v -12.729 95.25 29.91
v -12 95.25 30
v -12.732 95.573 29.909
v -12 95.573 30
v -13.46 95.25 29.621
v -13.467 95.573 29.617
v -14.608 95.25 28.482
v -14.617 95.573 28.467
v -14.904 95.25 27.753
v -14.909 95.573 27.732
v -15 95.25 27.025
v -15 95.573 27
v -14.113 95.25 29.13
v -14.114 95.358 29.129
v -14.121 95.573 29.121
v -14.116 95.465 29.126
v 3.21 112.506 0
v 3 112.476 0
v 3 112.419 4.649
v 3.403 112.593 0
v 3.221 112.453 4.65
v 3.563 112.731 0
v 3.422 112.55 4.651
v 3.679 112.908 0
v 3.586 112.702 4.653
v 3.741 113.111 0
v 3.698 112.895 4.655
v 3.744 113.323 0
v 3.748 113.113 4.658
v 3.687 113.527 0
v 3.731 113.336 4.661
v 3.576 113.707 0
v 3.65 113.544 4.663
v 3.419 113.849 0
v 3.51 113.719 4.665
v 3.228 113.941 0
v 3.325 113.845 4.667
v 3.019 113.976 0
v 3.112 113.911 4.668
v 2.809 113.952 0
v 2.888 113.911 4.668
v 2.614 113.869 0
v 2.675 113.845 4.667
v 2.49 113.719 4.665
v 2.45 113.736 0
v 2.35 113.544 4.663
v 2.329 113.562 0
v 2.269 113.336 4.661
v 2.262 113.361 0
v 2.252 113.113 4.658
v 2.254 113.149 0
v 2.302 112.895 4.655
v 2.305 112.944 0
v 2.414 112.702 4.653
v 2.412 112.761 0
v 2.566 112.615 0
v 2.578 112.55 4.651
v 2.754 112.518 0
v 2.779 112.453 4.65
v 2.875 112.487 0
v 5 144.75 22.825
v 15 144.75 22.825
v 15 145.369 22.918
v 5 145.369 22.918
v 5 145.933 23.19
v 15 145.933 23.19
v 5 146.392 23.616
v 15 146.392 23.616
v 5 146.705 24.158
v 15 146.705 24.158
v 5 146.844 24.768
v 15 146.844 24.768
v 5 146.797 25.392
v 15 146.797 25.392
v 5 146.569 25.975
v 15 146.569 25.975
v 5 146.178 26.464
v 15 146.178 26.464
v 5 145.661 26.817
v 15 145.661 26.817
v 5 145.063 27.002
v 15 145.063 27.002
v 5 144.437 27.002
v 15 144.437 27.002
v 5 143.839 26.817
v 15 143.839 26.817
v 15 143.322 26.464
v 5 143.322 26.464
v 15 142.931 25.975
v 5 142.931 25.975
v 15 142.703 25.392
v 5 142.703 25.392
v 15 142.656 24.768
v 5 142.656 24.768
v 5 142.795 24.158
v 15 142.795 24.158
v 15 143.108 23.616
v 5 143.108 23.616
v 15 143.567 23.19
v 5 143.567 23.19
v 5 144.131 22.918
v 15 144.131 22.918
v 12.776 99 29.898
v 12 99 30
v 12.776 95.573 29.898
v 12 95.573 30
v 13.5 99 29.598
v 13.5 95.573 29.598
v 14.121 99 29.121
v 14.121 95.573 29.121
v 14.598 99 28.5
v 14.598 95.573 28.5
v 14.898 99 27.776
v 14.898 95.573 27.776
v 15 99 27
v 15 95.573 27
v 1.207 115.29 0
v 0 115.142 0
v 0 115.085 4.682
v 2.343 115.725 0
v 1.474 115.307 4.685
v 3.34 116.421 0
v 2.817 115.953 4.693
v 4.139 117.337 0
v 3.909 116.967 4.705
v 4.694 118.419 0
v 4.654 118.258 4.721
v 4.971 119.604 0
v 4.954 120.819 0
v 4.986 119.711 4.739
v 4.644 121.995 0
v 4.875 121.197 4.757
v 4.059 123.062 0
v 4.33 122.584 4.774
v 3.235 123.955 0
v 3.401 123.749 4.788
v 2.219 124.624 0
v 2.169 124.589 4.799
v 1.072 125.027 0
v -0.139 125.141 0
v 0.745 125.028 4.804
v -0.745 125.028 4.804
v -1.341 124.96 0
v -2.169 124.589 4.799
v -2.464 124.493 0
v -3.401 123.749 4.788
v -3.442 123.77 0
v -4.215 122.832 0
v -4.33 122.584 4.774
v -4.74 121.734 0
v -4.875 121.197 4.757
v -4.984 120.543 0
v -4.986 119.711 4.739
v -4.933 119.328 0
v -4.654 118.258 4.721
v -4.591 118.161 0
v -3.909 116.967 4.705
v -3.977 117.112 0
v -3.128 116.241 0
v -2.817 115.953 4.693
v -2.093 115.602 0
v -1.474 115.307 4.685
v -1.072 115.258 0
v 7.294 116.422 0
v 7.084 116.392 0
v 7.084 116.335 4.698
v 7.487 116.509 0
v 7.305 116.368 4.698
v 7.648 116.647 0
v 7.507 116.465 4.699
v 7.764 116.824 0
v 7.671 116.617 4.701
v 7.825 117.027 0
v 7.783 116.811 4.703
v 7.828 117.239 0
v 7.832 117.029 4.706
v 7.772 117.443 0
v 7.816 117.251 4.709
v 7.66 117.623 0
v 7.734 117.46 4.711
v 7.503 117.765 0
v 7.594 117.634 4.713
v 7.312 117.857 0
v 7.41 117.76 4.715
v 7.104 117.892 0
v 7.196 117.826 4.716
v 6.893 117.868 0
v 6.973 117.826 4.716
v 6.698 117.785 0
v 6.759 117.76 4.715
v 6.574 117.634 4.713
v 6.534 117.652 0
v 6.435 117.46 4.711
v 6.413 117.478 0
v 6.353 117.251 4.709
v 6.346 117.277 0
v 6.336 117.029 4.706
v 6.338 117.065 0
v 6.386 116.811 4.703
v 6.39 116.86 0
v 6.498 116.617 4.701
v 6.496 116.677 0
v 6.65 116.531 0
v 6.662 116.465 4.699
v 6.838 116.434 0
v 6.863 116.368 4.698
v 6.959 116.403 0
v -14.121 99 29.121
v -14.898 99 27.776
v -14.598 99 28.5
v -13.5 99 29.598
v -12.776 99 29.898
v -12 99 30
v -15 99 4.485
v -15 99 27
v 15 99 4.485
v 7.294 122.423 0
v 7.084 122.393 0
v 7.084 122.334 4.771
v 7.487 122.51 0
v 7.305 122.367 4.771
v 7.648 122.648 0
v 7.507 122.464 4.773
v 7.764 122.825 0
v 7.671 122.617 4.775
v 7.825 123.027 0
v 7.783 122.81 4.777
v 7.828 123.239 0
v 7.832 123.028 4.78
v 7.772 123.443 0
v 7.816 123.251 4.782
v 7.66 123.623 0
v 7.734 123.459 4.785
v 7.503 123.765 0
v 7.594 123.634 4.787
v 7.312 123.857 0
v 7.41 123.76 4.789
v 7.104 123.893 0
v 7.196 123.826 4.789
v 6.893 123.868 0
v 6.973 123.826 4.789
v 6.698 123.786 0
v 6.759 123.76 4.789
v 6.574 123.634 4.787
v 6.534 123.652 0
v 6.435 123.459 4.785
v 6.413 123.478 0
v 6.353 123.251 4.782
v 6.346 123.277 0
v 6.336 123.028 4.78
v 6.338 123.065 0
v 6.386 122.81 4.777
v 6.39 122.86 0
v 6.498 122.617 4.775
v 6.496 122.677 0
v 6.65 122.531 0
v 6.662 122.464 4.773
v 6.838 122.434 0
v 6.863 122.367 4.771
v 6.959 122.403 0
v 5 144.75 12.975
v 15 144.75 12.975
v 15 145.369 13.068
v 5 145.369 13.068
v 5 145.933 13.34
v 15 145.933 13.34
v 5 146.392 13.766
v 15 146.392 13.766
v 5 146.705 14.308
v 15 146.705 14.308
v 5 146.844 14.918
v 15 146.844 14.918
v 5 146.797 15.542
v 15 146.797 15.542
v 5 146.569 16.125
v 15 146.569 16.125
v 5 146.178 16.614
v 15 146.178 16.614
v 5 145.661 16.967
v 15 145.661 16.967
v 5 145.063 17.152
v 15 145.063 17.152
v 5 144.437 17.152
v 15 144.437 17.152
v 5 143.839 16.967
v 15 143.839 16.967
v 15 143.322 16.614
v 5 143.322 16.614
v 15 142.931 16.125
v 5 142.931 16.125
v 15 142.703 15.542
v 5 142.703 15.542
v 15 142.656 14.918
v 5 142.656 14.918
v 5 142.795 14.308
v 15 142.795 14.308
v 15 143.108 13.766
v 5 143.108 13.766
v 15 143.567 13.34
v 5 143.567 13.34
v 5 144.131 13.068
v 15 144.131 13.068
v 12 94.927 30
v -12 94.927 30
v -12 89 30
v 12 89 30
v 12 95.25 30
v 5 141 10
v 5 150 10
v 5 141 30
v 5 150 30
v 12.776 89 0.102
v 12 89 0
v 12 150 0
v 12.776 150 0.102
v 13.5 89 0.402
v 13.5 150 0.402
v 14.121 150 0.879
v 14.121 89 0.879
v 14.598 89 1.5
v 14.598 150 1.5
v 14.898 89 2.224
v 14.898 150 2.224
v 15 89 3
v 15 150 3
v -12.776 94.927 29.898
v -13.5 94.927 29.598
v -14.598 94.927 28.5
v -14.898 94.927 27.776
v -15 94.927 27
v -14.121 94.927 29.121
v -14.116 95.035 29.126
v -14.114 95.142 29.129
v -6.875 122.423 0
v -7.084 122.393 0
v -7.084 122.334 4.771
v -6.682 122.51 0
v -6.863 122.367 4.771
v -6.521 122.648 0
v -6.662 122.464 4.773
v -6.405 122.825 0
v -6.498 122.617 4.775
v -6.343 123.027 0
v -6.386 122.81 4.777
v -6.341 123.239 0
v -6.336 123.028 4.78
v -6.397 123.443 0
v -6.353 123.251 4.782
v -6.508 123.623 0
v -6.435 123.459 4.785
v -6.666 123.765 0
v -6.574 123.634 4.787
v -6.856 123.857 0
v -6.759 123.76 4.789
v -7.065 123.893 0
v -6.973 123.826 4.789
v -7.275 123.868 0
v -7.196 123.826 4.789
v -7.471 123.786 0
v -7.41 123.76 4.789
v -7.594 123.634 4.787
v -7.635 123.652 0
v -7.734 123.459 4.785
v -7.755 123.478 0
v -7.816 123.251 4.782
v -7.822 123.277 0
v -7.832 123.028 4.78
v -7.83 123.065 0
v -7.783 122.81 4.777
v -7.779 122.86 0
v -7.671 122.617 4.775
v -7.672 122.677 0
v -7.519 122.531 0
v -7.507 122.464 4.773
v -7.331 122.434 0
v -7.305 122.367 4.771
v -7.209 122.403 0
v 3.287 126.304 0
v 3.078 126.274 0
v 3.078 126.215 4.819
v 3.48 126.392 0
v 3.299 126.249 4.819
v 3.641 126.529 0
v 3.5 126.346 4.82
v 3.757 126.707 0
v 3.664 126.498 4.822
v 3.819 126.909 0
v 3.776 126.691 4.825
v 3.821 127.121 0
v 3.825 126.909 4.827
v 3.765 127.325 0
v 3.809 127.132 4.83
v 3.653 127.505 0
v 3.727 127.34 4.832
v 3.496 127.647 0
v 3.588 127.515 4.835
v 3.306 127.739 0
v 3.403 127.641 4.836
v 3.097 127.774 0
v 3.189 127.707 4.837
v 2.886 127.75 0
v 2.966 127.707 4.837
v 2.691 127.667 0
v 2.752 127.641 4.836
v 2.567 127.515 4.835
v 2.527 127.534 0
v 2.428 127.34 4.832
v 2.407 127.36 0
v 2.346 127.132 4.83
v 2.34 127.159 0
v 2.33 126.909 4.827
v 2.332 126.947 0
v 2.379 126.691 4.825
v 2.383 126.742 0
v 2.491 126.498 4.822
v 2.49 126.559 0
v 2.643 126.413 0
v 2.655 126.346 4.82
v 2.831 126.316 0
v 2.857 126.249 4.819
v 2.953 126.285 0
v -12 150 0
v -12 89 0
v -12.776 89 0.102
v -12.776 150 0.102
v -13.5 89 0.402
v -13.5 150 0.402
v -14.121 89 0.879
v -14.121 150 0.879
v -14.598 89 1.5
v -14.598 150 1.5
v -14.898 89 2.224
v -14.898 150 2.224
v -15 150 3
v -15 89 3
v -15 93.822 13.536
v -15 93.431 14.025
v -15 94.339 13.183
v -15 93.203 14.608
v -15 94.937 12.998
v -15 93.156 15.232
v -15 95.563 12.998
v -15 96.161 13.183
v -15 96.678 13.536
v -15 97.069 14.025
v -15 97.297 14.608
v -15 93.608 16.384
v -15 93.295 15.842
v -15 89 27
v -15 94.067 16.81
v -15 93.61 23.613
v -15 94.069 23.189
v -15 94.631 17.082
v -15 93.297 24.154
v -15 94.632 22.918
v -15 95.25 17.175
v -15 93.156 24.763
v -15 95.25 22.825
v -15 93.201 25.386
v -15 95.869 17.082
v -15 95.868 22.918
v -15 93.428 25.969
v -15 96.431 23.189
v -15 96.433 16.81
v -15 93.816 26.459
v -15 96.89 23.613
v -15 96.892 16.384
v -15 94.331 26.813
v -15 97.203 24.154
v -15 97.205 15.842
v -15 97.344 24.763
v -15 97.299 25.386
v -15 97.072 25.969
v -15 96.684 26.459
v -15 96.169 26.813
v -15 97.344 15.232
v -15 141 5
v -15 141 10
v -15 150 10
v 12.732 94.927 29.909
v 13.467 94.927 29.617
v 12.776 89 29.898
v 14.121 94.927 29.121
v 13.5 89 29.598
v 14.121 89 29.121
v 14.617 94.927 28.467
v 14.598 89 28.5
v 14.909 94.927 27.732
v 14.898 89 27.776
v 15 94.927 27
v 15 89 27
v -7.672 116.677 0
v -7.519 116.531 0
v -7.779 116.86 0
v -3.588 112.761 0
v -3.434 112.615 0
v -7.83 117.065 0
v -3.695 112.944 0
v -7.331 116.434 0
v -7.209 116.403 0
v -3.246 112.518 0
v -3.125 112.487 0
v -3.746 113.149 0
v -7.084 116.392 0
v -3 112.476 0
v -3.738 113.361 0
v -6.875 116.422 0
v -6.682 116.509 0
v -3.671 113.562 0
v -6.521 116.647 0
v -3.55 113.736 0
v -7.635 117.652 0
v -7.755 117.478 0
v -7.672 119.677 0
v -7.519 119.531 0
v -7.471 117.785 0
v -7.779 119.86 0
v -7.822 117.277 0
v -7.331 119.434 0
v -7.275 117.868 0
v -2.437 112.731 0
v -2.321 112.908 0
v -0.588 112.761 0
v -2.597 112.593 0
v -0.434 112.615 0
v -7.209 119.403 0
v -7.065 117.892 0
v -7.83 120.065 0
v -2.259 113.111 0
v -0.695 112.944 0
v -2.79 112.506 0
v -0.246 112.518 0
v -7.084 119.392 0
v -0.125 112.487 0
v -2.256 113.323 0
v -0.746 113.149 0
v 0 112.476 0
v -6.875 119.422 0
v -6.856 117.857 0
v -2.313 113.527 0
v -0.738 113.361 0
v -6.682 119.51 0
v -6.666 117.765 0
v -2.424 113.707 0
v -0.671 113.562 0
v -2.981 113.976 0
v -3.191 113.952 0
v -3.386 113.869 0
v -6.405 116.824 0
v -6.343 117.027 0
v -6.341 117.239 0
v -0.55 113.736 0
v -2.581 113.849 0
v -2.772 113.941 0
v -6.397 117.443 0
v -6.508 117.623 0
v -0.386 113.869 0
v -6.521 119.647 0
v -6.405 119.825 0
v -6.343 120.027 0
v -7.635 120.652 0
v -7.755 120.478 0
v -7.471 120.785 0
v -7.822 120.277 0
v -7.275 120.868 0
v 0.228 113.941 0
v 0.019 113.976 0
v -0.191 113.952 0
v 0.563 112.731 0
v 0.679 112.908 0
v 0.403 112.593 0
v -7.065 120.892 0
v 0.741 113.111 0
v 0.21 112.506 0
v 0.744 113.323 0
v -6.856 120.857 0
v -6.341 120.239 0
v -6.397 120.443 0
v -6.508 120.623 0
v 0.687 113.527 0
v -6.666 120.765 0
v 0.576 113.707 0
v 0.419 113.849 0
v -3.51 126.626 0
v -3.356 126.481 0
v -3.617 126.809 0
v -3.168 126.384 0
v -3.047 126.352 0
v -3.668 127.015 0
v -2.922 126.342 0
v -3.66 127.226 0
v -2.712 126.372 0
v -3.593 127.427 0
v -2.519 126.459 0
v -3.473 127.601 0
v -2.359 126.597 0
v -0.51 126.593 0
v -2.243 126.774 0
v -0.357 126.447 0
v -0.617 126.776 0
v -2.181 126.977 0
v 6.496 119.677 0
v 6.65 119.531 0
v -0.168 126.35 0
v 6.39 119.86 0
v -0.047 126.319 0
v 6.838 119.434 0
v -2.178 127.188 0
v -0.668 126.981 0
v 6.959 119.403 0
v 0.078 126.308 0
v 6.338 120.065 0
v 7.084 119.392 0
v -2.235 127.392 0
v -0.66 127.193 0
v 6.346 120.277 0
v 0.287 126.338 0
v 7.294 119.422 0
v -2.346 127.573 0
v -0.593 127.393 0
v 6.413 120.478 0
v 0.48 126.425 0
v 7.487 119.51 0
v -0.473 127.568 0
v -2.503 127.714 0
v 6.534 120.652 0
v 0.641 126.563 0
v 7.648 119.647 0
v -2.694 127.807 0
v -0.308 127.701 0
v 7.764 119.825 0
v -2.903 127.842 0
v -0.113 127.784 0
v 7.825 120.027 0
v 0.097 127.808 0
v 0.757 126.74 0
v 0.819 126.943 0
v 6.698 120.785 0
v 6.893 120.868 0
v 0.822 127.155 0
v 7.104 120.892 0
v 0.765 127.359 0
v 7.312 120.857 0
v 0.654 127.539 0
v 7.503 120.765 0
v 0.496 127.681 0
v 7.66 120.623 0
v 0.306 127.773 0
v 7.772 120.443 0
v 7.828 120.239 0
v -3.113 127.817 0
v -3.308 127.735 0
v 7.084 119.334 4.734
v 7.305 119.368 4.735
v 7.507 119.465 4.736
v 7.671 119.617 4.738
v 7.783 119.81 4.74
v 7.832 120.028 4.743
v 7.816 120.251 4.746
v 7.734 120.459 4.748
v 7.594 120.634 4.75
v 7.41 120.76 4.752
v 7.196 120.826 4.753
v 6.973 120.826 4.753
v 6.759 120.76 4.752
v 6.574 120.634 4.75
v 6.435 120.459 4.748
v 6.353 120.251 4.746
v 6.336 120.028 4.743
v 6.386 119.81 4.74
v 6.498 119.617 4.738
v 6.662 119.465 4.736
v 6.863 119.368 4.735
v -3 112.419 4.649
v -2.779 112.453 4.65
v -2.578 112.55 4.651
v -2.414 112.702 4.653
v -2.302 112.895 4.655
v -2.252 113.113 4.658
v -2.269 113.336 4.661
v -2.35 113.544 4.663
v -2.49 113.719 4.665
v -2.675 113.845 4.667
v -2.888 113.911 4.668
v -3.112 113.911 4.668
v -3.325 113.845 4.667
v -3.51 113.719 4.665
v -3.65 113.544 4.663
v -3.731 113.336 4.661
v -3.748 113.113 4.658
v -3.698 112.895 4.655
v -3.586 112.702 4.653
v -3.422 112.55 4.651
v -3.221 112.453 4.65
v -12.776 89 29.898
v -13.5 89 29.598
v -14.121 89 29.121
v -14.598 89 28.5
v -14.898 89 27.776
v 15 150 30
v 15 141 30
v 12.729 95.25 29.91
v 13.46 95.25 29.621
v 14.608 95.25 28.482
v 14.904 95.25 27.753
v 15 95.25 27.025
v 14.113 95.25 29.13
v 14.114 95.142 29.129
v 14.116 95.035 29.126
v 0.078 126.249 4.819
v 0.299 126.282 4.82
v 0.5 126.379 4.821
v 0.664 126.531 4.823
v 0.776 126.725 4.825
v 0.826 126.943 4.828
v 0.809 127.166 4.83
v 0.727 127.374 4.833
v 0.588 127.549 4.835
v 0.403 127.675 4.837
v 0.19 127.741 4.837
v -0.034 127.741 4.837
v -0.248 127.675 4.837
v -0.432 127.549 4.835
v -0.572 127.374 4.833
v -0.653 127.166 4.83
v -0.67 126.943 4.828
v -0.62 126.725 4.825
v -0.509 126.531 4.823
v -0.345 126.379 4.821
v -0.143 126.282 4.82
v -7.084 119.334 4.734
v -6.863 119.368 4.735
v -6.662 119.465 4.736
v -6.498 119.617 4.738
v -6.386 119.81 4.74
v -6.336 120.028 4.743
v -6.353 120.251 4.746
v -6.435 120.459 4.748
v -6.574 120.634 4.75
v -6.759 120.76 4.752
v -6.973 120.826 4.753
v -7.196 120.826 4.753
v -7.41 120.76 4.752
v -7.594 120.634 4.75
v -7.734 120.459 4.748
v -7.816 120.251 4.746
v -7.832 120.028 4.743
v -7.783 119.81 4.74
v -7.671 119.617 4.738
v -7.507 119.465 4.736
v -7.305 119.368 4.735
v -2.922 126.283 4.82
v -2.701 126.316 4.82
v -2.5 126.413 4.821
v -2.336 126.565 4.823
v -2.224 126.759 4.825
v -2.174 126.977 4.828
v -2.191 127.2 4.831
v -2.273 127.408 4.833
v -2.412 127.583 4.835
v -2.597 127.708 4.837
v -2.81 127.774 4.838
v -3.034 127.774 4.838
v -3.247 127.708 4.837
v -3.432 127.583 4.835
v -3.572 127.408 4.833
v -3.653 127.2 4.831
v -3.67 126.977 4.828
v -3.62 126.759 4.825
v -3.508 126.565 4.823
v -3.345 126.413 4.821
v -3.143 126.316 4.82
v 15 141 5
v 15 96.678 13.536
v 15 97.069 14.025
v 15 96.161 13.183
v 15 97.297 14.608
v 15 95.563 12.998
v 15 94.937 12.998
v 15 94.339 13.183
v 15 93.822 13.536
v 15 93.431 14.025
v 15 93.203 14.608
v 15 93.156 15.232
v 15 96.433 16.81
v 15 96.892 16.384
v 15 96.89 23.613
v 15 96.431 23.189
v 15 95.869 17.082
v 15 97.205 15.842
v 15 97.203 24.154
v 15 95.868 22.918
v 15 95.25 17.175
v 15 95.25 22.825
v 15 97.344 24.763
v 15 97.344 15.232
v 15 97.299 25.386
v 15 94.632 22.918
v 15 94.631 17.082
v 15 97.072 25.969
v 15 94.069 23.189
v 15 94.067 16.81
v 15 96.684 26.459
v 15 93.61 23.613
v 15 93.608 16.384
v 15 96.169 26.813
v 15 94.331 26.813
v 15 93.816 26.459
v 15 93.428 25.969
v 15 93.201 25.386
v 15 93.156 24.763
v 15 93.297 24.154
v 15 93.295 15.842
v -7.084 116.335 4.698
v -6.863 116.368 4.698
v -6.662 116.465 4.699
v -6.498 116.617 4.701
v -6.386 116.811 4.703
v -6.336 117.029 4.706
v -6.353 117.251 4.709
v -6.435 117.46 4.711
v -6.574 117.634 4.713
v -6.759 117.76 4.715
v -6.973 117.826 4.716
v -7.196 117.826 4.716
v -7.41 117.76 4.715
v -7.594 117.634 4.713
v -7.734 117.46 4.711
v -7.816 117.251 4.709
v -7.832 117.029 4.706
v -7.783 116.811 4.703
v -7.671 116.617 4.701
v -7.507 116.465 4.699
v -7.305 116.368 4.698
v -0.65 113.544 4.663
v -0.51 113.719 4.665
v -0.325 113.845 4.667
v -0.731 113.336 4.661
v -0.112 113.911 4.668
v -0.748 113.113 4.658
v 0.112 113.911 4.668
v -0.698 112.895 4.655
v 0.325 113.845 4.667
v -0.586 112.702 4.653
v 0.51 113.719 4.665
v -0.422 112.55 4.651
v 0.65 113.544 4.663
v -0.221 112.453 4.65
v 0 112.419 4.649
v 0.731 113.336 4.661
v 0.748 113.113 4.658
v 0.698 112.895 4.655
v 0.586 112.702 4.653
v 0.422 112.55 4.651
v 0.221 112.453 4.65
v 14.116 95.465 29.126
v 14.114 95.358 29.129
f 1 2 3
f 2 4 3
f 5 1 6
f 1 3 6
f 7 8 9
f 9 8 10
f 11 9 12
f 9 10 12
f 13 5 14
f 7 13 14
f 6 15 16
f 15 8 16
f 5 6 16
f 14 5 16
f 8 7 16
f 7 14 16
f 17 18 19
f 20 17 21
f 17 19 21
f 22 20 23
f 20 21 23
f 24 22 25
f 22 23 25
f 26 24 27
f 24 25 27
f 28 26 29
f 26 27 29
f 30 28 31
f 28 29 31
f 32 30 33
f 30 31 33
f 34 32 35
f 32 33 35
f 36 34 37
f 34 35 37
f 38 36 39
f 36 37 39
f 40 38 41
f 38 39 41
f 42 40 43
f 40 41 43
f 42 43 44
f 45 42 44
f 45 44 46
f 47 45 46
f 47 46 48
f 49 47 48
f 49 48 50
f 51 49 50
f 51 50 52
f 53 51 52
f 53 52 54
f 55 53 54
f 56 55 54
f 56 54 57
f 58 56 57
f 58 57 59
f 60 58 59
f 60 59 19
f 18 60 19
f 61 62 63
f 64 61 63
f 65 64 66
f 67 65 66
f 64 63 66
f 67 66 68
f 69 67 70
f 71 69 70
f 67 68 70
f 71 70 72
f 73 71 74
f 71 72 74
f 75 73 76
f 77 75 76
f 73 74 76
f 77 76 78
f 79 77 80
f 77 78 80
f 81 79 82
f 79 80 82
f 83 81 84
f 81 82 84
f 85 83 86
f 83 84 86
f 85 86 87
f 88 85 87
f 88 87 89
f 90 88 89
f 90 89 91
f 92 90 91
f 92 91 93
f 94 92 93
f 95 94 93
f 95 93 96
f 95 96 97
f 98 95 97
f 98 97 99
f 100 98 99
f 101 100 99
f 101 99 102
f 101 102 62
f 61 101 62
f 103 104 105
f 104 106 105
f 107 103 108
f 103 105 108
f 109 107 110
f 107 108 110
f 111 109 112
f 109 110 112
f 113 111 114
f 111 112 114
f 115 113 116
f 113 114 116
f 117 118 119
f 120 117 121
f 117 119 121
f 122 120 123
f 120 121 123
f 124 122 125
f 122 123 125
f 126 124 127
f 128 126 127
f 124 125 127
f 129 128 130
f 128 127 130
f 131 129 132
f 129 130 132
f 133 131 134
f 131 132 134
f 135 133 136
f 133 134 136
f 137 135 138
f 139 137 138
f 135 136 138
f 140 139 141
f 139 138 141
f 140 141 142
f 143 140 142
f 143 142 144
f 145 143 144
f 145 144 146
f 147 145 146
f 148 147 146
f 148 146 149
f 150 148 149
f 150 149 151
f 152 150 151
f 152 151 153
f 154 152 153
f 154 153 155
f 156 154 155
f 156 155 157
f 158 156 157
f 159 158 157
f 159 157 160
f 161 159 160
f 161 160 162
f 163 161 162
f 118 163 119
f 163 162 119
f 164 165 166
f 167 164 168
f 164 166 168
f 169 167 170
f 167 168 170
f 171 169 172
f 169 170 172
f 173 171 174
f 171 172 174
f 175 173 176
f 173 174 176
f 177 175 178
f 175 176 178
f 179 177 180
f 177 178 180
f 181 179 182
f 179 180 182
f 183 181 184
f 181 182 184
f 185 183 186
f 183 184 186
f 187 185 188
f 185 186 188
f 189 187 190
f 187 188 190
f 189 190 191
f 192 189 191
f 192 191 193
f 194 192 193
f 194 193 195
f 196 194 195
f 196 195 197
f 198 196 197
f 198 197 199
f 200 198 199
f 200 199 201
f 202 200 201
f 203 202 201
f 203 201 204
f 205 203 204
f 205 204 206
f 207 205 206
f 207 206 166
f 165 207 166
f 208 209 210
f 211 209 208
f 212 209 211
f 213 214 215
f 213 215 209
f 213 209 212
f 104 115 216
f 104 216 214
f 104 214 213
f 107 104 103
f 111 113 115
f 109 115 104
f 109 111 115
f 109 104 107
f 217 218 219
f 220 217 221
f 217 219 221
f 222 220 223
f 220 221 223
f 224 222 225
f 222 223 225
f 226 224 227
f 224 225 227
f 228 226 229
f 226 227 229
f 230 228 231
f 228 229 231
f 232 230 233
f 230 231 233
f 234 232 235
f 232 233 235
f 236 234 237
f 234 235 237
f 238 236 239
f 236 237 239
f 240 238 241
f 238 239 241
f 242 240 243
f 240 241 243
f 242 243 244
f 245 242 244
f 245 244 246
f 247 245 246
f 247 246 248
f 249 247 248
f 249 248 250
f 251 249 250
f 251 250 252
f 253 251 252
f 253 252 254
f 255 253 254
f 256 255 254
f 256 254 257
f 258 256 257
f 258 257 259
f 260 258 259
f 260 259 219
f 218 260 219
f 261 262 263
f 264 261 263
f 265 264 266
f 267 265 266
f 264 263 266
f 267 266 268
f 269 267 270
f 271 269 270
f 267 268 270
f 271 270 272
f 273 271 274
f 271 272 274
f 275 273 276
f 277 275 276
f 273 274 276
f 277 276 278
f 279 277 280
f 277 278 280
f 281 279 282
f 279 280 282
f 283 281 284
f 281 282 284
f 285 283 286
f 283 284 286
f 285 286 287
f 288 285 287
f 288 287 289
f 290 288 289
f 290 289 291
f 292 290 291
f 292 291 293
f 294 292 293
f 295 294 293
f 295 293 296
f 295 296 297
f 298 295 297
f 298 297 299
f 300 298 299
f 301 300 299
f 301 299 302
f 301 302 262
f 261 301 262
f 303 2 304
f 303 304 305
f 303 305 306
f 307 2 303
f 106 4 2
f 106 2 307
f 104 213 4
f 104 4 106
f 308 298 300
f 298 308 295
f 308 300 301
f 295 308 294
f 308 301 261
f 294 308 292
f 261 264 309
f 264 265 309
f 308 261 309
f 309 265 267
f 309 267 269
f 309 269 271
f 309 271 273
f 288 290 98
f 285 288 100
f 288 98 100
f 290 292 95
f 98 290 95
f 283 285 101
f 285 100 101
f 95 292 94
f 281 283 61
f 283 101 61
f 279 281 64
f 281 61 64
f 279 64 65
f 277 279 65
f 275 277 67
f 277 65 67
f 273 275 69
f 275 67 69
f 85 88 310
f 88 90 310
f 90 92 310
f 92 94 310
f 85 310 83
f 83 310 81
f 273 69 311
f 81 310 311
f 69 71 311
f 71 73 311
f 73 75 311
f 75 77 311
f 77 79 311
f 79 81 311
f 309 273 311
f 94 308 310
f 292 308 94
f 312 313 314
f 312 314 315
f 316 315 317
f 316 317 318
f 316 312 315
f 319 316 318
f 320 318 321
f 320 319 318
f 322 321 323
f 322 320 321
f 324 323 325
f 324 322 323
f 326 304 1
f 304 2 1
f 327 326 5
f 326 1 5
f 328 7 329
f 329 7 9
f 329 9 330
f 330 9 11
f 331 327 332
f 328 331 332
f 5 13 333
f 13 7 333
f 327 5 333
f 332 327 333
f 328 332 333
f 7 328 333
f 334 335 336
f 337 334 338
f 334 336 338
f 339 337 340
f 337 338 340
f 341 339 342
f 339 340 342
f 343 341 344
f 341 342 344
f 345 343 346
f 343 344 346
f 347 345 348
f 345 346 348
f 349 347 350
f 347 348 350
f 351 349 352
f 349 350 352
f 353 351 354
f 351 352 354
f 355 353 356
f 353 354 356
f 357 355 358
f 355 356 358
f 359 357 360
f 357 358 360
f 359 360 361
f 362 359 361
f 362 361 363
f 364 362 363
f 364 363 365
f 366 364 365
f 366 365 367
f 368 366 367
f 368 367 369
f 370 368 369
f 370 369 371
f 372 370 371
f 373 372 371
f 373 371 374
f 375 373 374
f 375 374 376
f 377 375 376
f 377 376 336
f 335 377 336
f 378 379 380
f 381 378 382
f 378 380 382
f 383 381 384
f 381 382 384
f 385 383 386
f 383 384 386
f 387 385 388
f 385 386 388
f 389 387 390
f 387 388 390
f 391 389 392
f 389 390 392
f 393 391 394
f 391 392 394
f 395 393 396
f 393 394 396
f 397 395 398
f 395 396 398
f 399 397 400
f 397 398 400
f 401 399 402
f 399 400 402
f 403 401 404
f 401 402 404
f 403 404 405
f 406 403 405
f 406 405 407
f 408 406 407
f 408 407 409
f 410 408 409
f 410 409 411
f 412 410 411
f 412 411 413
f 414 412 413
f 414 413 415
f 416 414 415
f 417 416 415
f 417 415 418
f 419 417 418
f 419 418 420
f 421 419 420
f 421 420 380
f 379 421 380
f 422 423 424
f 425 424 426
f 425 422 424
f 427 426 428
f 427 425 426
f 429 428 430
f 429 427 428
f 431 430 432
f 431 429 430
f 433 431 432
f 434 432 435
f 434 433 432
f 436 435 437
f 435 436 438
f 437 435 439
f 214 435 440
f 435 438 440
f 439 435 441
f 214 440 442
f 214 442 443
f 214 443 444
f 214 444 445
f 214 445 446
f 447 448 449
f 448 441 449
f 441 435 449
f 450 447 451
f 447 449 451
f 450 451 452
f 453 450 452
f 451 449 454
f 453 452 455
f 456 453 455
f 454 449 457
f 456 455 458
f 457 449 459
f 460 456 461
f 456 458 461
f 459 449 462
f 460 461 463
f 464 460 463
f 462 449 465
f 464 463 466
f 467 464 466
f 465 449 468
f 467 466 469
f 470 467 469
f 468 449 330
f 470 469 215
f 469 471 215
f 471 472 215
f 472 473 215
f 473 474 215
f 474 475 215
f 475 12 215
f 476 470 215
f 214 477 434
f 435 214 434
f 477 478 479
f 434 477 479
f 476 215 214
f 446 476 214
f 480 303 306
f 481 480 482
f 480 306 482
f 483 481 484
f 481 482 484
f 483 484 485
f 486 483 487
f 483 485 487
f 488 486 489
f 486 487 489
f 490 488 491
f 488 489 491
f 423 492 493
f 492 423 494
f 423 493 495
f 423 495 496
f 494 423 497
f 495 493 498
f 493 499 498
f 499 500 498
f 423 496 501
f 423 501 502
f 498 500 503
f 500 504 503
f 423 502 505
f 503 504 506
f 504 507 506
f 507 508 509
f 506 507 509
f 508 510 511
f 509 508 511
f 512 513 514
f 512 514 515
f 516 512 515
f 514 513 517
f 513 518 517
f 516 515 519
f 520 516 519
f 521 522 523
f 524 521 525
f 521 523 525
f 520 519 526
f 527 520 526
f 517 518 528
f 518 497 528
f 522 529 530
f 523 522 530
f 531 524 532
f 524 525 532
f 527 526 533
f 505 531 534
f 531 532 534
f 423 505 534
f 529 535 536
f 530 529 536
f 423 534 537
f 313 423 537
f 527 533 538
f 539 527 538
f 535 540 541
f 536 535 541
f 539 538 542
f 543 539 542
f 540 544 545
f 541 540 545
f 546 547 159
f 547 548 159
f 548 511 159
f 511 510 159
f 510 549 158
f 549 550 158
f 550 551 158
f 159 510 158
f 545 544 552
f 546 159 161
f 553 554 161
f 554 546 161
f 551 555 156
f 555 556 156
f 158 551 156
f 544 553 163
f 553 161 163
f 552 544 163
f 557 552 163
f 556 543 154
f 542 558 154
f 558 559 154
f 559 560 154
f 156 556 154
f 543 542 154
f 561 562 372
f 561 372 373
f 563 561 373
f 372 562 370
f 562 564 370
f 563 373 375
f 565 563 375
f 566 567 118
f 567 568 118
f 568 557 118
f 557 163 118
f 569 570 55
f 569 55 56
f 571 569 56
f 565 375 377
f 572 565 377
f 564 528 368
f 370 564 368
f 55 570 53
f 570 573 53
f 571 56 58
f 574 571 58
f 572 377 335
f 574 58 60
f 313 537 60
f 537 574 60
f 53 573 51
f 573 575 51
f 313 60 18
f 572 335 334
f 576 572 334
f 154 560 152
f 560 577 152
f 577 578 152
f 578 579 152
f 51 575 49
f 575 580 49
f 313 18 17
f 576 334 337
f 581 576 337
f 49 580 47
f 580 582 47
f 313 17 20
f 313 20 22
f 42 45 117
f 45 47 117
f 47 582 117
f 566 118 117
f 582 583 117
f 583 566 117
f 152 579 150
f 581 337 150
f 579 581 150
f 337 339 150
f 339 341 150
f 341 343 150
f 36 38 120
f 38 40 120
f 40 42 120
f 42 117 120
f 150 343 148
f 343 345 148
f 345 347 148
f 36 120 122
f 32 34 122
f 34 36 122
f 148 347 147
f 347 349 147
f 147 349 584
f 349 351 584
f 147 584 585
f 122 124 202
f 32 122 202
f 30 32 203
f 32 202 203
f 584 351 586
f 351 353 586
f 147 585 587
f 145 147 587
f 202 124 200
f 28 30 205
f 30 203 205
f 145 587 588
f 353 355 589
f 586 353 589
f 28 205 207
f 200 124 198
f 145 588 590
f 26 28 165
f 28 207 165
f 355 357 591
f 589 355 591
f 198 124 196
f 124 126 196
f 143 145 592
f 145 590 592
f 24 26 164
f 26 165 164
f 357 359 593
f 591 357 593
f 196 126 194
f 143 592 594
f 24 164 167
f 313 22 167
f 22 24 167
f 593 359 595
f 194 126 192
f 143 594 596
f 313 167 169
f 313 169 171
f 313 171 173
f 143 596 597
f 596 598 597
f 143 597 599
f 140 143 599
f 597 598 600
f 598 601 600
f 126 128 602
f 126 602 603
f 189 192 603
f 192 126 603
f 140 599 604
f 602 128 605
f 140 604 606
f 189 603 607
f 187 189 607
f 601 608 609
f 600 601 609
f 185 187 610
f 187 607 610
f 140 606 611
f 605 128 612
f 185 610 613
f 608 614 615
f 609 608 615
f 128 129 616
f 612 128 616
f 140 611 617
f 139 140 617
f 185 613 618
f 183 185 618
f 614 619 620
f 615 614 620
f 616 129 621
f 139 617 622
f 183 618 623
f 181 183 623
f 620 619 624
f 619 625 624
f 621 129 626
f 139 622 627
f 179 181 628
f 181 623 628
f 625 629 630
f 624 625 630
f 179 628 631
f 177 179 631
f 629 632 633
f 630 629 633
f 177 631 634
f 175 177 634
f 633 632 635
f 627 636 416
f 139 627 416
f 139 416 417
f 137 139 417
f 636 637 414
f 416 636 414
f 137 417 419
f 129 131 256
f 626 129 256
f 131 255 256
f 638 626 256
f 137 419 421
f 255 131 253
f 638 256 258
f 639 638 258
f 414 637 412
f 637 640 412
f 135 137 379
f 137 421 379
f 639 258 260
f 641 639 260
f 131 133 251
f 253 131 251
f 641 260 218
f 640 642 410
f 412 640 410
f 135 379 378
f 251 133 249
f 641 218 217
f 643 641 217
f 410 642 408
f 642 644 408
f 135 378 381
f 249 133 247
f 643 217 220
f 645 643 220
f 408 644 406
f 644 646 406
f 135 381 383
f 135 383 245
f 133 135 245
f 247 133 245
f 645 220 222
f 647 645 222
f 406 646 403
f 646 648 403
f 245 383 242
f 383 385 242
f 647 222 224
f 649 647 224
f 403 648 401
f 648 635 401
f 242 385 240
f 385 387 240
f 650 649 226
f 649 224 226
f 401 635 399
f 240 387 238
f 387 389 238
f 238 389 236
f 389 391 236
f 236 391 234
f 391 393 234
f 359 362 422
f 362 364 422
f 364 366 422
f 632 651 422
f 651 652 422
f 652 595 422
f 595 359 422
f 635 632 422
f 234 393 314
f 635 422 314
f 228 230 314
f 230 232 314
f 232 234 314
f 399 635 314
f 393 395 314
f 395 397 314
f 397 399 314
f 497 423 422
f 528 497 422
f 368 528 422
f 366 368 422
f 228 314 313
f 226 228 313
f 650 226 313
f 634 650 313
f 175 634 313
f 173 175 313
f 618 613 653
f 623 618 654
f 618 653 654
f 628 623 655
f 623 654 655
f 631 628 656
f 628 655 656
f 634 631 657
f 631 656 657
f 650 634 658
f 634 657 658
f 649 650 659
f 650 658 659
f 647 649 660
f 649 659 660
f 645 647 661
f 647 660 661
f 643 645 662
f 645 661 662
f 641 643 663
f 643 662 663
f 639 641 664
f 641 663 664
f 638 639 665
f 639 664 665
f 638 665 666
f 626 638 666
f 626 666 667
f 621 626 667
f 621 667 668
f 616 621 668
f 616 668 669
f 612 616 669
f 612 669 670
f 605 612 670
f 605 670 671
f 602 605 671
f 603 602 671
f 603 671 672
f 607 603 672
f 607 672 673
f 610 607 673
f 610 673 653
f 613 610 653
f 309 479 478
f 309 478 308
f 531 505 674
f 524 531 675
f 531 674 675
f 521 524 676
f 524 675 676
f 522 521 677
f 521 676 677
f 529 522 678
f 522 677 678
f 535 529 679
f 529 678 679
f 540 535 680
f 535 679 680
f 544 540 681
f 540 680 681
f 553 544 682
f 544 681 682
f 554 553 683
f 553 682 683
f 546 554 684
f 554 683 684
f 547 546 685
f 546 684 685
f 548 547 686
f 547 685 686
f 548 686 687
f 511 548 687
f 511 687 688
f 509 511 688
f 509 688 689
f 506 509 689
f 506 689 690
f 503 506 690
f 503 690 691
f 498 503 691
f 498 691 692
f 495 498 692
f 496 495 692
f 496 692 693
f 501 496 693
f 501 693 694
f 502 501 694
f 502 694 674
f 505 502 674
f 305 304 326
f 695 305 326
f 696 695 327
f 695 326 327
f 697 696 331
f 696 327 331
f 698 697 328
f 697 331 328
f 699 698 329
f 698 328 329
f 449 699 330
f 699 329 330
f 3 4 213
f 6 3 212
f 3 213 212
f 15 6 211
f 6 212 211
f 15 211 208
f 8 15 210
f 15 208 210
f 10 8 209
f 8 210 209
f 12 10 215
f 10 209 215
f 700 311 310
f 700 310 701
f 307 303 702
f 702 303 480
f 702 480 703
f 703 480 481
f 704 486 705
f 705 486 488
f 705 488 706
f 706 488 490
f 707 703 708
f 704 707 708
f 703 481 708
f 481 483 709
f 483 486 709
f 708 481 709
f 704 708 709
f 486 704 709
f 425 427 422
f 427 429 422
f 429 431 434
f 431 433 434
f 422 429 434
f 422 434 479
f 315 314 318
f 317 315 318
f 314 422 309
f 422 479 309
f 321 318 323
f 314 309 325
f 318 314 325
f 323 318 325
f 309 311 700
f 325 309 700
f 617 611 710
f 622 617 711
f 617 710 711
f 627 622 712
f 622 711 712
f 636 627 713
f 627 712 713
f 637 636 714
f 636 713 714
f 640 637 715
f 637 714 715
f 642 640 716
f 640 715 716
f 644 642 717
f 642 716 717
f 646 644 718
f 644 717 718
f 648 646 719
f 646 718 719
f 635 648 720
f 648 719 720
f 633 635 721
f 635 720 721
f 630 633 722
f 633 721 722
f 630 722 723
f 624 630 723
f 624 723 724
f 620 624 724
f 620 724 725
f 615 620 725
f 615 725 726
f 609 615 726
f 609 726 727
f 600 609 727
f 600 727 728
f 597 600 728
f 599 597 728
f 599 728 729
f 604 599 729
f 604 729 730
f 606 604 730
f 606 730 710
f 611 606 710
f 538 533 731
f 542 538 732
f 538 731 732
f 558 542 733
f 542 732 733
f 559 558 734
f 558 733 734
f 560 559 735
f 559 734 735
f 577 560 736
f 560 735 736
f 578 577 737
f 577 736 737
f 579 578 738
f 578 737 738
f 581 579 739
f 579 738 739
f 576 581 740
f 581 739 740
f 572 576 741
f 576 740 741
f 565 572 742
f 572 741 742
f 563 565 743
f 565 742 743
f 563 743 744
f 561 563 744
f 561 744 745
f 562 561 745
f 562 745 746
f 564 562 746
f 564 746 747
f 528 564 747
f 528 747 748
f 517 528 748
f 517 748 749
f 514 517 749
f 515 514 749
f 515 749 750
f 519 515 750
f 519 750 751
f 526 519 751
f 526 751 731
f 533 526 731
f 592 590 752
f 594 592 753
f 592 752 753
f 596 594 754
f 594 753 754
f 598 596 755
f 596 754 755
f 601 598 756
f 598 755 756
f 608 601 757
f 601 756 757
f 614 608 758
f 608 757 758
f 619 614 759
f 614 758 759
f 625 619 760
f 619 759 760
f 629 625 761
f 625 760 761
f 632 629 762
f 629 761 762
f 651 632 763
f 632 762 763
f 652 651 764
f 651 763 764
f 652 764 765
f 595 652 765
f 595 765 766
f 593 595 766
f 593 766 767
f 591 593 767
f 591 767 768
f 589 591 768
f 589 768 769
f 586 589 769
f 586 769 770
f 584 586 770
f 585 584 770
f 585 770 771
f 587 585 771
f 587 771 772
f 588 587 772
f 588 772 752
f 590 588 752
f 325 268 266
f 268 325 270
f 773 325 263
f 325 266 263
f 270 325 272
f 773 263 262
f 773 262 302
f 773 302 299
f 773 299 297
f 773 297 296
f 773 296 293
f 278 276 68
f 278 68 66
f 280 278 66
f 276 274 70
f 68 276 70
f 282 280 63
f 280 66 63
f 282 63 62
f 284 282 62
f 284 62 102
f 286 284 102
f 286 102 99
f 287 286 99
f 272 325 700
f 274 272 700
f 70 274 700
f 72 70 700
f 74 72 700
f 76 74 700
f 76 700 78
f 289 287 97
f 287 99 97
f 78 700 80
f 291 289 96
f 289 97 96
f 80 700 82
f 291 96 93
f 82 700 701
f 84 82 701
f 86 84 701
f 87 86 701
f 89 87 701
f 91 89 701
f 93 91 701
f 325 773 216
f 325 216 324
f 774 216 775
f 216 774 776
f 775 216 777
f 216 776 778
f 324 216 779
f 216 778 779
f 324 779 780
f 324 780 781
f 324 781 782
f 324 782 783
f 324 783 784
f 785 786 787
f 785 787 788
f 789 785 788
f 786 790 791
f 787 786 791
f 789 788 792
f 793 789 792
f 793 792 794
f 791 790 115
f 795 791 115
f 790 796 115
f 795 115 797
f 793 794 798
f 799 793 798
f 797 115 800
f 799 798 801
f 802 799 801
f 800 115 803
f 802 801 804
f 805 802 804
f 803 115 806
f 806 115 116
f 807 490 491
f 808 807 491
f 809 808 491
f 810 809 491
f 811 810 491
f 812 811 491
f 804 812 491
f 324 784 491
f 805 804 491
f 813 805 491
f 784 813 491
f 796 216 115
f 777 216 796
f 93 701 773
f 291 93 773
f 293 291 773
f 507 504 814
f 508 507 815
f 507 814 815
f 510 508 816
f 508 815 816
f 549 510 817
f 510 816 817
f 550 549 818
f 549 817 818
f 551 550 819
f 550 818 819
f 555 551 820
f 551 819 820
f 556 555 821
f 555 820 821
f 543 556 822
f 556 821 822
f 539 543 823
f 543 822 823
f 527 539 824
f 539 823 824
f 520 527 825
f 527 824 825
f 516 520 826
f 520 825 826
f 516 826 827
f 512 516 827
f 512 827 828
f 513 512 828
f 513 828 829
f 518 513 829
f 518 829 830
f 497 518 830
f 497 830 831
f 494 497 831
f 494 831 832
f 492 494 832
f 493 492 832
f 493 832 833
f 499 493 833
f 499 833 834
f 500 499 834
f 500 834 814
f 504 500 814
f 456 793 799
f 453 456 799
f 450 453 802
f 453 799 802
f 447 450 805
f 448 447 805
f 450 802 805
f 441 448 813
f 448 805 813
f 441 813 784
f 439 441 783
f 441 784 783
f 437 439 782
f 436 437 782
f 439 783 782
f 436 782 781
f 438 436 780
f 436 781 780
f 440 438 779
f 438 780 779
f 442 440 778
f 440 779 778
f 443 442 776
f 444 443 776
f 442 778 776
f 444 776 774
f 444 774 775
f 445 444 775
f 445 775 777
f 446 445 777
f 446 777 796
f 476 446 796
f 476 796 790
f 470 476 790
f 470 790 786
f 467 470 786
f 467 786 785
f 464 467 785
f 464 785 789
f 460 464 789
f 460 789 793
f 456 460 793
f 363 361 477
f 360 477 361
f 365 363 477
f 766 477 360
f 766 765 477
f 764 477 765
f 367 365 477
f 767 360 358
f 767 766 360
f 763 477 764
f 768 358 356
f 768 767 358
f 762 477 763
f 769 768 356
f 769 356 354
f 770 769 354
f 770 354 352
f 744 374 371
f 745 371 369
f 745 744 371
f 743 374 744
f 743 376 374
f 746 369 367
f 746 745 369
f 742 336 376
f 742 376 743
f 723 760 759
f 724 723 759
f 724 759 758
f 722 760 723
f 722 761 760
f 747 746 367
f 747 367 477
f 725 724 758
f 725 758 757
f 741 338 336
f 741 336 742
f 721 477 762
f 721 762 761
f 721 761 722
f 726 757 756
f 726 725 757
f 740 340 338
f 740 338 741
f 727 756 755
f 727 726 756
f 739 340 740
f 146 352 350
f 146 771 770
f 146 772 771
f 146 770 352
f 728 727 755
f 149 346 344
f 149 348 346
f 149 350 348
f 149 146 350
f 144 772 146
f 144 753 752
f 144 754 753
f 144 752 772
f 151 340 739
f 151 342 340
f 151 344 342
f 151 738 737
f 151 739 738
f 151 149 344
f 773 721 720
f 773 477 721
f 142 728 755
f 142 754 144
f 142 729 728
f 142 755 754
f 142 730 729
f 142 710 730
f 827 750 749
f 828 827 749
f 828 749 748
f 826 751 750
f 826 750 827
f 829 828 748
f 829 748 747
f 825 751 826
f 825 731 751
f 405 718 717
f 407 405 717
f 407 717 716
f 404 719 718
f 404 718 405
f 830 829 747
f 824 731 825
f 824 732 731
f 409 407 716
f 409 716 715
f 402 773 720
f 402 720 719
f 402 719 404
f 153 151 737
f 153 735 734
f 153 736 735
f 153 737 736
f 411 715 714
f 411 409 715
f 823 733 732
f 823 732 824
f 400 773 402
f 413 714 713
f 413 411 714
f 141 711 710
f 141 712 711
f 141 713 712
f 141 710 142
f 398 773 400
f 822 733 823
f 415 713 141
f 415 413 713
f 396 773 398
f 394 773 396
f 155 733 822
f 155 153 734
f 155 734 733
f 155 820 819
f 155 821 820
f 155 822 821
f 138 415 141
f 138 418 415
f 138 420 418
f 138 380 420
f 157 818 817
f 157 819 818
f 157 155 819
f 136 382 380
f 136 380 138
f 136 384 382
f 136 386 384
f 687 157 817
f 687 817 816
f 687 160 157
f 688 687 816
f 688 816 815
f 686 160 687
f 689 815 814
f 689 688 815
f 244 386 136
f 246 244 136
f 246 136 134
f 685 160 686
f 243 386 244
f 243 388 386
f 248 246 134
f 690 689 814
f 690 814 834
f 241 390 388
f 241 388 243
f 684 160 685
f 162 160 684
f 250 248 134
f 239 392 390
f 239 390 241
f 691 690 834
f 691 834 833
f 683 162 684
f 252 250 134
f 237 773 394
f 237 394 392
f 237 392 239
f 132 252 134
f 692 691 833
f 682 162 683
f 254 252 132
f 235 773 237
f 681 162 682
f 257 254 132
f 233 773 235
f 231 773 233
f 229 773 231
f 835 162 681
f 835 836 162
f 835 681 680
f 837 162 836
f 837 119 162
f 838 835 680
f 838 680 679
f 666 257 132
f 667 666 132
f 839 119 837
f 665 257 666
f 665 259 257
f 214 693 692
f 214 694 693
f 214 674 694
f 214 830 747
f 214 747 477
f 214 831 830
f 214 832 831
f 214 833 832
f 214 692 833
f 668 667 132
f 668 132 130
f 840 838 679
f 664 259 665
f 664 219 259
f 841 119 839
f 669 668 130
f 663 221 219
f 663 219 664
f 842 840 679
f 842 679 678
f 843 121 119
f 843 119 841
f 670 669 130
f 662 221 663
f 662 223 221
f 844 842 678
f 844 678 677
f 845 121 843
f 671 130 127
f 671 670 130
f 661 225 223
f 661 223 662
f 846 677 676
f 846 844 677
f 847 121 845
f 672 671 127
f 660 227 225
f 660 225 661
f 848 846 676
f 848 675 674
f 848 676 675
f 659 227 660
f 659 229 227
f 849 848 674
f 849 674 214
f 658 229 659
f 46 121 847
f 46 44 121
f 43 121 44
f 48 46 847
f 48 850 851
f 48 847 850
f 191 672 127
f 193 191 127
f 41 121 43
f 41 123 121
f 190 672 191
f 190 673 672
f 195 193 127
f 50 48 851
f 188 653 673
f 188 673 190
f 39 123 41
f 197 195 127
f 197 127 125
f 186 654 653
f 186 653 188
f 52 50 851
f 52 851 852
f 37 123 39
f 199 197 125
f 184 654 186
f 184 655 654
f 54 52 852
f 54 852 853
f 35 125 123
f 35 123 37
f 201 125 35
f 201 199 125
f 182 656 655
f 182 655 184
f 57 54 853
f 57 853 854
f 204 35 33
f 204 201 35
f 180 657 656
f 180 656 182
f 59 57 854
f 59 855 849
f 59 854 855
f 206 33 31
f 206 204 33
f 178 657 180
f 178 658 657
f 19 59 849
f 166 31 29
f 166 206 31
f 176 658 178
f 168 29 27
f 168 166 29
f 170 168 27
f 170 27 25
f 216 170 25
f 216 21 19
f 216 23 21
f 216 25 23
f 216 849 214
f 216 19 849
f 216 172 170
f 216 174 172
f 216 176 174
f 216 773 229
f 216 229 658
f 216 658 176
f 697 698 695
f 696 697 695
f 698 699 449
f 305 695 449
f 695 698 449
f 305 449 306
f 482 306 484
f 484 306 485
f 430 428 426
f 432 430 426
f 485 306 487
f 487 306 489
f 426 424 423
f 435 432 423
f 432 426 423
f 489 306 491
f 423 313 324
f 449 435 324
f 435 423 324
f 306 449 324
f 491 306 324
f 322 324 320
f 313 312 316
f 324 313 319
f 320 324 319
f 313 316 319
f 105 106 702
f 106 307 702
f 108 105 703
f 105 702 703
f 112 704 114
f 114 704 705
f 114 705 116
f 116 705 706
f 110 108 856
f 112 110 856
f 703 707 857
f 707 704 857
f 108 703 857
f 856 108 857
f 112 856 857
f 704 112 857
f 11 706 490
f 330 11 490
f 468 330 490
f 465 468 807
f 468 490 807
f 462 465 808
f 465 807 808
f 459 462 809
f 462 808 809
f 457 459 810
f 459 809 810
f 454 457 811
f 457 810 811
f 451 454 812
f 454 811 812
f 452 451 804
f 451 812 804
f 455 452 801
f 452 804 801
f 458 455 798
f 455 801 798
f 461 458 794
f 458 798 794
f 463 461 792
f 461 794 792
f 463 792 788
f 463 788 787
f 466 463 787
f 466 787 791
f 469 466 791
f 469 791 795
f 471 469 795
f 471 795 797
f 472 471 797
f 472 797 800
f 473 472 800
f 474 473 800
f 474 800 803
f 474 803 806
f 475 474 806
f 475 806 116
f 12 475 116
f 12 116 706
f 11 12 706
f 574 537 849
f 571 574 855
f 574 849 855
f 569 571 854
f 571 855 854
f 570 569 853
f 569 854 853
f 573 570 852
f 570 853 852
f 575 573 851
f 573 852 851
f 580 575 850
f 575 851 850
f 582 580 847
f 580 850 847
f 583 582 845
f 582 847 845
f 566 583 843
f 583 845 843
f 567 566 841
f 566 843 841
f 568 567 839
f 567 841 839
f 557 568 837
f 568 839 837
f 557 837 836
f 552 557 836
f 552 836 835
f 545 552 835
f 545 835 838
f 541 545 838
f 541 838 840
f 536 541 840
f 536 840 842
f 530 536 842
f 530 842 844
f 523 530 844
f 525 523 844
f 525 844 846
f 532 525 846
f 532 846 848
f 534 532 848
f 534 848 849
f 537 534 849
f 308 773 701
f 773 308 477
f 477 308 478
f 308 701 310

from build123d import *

# Parameters (mm, degrees)
SKETCH_1_W          = 44.75
SKETCH_1_H          = 50
EXTRUDE_1_DEPTH     = 30
SHELL_1_T           = 5
FILLET_1_R          = 5
SKETCH_2_R          = 0.75
CUT_EXTRUDE_1_DEPTH = 70.264438928
SKETCH_3_R          = 5
CUT_EXTRUDE_2_DEPTH = 70.264438928
EXTRUDE_2_DEPTH     = 30
CUT_EXTRUDE_3_DEPTH = 20
SKETCH_7_R          = 2.1
CUT_EXTRUDE_4_DEPTH = 159.731347329
SKETCH_8_W          = 18
SKETCH_8_H          = 45
CUT_EXTRUDE_5_DEPTH = 10
SKETCH_9_W          = 18
SKETCH_9_H          = 45
CUT_EXTRUDE_6_DEPTH = 10
FILLET_2_R          = 3
SKETCH_10_W         = 85.567589514
SKETCH_10_H         = 51.13951385
CUT_EXTRUDE_7_DEPTH = 122.018141743
CUT_EXTRUDE_8_DEPTH = 156.88457272
SKETCH_12_R         = 5
SKETCH_12_R_2       = 0.75
CUT_EXTRUDE_9_DEPTH = 154.138857117


with BuildPart() as part:
    # 草图1 → 凸台-拉伸1 (new body)
    with BuildSketch(Plane.XY):
        Rectangle(SKETCH_1_W, SKETCH_1_H)
    extrude(amount=EXTRUDE_1_DEPTH)

    # 抽壳1
    shell_1_openings = [part.faces().sort_by_distance(p)[0] for p in [
        (0, -25, 15),
        (0, 0, 0),
        (0, 0, 30),
    ]]
    offset(amount=SHELL_1_T, openings=shell_1_openings, kind=Kind.INTERSECTION)

    # 圆角1
    # the kernel refuses this fillet: 5 mm, written as the material it takes off along each edge
    with BuildSketch(Plane(origin=(-27.375, 30, -12.5), x_dir=(1, 0, 0), z_dir=(0, 0, 1)), Plane(origin=(-27.375, -25, 42.5), x_dir=(1, 0, 0), z_dir=(0, 0, -1)), Plane(origin=(27.375, -25, -12.5), x_dir=(-1, 0, 0), z_dir=(0, 0, 1)), Plane(origin=(27.375, 30, 42.5), x_dir=(-1, 0, 0), z_dir=(0, 0, -1))) as fillet_1_piece_1:
        with BuildLine():
            CenterArc((FILLET_1_R, -FILLET_1_R), FILLET_1_R, 90, 90)
            Line((0, -FILLET_1_R), (0, 0))
            Line((0, 0), (FILLET_1_R, 0))
        make_face()
    extrude(amount=55, mode=Mode.SUBTRACT)
    with BuildSketch(Plane(origin=(-27.375, -37.5, 30), x_dir=(1, 0, 0), z_dir=(0, 1, 0)), Plane(origin=(27.375, 42.5, 30), x_dir=(-1, 0, 0), z_dir=(0, -1, 0))) as fillet_1_piece_2:
        with BuildLine():
            CenterArc((FILLET_1_R, FILLET_1_R), FILLET_1_R, 180, 90)
            Line((0, FILLET_1_R), (0, 0))
            Line((0, 0), (FILLET_1_R, 0))
        make_face()
    extrude(amount=80, mode=Mode.SUBTRACT)
    with BuildSketch(Plane(origin=(-27.375, -37.5, 0), x_dir=(1, 0, 0), z_dir=(0, 1, 0)), Plane(origin=(27.375, 42.5, 0), x_dir=(-1, 0, 0), z_dir=(0, -1, 0))) as fillet_1_piece_3:
        with BuildLine():
            CenterArc((FILLET_1_R, -FILLET_1_R), FILLET_1_R, 90, 90)
            Line((0, -FILLET_1_R), (0, 0))
            Line((0, 0), (FILLET_1_R, 0))
        make_face()
    extrude(amount=80, mode=Mode.SUBTRACT)

    # 草图2 → 切除-拉伸1 (cut, through all)
    with BuildSketch(Plane.ZY.offset(27.375)):
        with Locations(Location((15, 7, 0), (0, 0, 270))):
            Circle(SKETCH_2_R)
        with Locations(Location((12, 7, 0), (0, 0, 270))):
            Circle(SKETCH_2_R)
        with Locations(Location((18, 7, 0), (0, 0, 270))):
            Circle(SKETCH_2_R)
        with Locations(Location((8, -3, 0), (0, 0, 90))):
            Circle(SKETCH_2_R)
        with Locations(Location((8, 0, 0), (0, 0, 90))):
            Circle(SKETCH_2_R)
        with Locations(Location((8, 3, 0), (0, 0, 90))):
            Circle(SKETCH_2_R)
        with Locations(Location((12, -7, 0), (0, 0, 90))):
            Circle(SKETCH_2_R)
        with Locations(Location((15, -7, 0), (0, 0, 90))):
            Circle(SKETCH_2_R)
        with Locations(Location((18, -7, 0), (0, 0, 90))):
            Circle(SKETCH_2_R)
        with Locations(Location((22, -3, 0), (0, 0, 270))):
            Circle(SKETCH_2_R)
        with Locations(Location((22, 0, 0), (0, 0, 270))):
            Circle(SKETCH_2_R)
        with Locations(Location((22, 3, 0), (0, 0, 270))):
            Circle(SKETCH_2_R)
    extrude(amount=-CUT_EXTRUDE_1_DEPTH, mode=Mode.SUBTRACT)

    # 草图3 → 切除-拉伸2 (cut, through all)
    with BuildSketch(Plane(origin=(27.375, 0, 0), x_dir=(0, 0, -1), z_dir=(1, 0, 0))):
        with Locations(Location((-15, 0, 0), (0, 0, 90))):
            Circle(SKETCH_3_R)
    extrude(amount=-CUT_EXTRUDE_2_DEPTH, mode=Mode.SUBTRACT)

    # 草图4 → 凸台-拉伸2 (add)
    with BuildSketch(Plane.XY.offset(30)):
        Polygon((0, 30), (-15, 30), (-15, 150), (15, 150), (15, 30), align=None)
    extrude(amount=-EXTRUDE_2_DEPTH)

    # 草图6 → 切除-拉伸3 (cut)
    with BuildSketch(Plane.XY.offset(30)):
        Polygon((-15, 99), (15, 99), (15, 141), (5, 141), (5, 150), (-15, 150), (-15, 141), align=None)
    extrude(amount=-CUT_EXTRUDE_3_DEPTH, mode=Mode.SUBTRACT)

    # 草图7 → 切除-拉伸4 (cut, through all)
    with BuildSketch(Plane(origin=(15, 0, 0), x_dir=(0, 0, -1), z_dir=(1, 0, 0))):
        with Locations((-24.925, 144.75)):
            Circle(SKETCH_7_R)
        with Locations((-15.075, 144.75)):
            Circle(SKETCH_7_R)
        with Locations(Location((-15.075, 95.25, 0), (0, 0, 180))):
            Circle(SKETCH_7_R)
        with Locations(Location((-24.925, 95.25, 0), (0, 0, 180))):
            Circle(SKETCH_7_R)
    extrude(amount=-CUT_EXTRUDE_4_DEPTH, mode=Mode.SUBTRACT)

    # 草图8 → 切除-拉伸5 (cut)
    with BuildSketch(Plane.XY.offset(30)):
        with Locations((0, 64.5)):
            Rectangle(SKETCH_8_W, SKETCH_8_H)
    extrude(amount=-CUT_EXTRUDE_5_DEPTH, mode=Mode.SUBTRACT)

    # 草图9 → 切除-拉伸6 (cut)
    with BuildSketch(Plane(origin=(0, 0, 0), x_dir=(-1, 0, 0), z_dir=(0, 0, -1))):
        with Locations((0, 65)):
            Rectangle(SKETCH_9_W, SKETCH_9_H)
    extrude(amount=-CUT_EXTRUDE_6_DEPTH, mode=Mode.SUBTRACT)

    # 圆角2
    fillet_2_edges = [part.edges().sort_by_distance(p)[0] for p in [
        (-15, 90, 0),
        (15, 90, 0),
        (15, 64.5, 30),
        (-15, 64.5, 30),
    ]]
    fillet(fillet_2_edges, radius=FILLET_2_R)

    # 草图10 → 切除-拉伸7 (cut, through all)
    with BuildSketch(Plane(origin=(0, 89, 0), x_dir=(1, 0, 0), z_dir=(0, 1, 0))):
        with Locations((0, -19.677859547)):
            Rectangle(SKETCH_10_W, SKETCH_10_H)
    extrude(amount=-CUT_EXTRUDE_7_DEPTH, mode=Mode.SUBTRACT)

    # 草图11 → 切除-拉伸8 (cut, through all)
    with BuildSketch(Plane(origin=(15, 0, 0), x_dir=(0, 0, -1), z_dir=(1, 0, 0))):
        Polygon((-10, 99), (-10, 141), (-5, 141), (-4.484921434, 99), align=None)
    extrude(amount=-CUT_EXTRUDE_8_DEPTH, mode=Mode.SUBTRACT)

    # 草图12 → 切除-拉伸9 (cut, through all)
    with BuildSketch(Plane(origin=(0, -0.040106419, 3.270315816), x_dir=(1, 0, 0), z_dir=(0, -0.012262853244216906, 0.9999248083882663))):
        with Locations(Location((0, 120.133486449, 0), (0, 0, 270))):
            Circle(SKETCH_12_R)
        with Locations(Location((7.084353343, 120.133486449, 0), (0, 0, 270))):
            Circle(SKETCH_12_R_2)
        with Locations(Location((7.084353343, 117.133486449, 0), (0, 0, 270))):
            Circle(SKETCH_12_R_2)
        with Locations(Location((3.077588855, 127.014955444, 0), (0, 0, 270))):
            Circle(SKETCH_12_R_2)
        with Locations(Location((-2.922031664, 127.082435984, 0), (0, 0, 270))):
            Circle(SKETCH_12_R_2)
        with Locations(Location((-7.084353343, 123.133486449, 0), (0, 0, 270))):
            Circle(SKETCH_12_R_2)
        with Locations(Location((-7.084353343, 117.133486449, 0), (0, 0, 270))):
            Circle(SKETCH_12_R_2)
        with Locations(Location((-3, 113.217839792, 0), (0, 0, 270))):
            Circle(SKETCH_12_R_2)
        with Locations(Location((0, 113.217839792, 0), (0, 0, 270))):
            Circle(SKETCH_12_R_2)
        with Locations(Location((3, 113.217839792, 0), (0, 0, 270))):
            Circle(SKETCH_12_R_2)
        with Locations(Location((7.084353343, 123.133486449, 0), (0, 0, 270))):
            Circle(SKETCH_12_R_2)
        with Locations(Location((0.077778595, 127.048695714, 0), (0, 0, 270))):
            Circle(SKETCH_12_R_2)
        with Locations(Location((-7.084353343, 120.133486449, 0), (0, 0, 270))):
            Circle(SKETCH_12_R_2)
    extrude(amount=-CUT_EXTRUDE_9_DEPTH, mode=Mode.SUBTRACT)


solid = part.part
